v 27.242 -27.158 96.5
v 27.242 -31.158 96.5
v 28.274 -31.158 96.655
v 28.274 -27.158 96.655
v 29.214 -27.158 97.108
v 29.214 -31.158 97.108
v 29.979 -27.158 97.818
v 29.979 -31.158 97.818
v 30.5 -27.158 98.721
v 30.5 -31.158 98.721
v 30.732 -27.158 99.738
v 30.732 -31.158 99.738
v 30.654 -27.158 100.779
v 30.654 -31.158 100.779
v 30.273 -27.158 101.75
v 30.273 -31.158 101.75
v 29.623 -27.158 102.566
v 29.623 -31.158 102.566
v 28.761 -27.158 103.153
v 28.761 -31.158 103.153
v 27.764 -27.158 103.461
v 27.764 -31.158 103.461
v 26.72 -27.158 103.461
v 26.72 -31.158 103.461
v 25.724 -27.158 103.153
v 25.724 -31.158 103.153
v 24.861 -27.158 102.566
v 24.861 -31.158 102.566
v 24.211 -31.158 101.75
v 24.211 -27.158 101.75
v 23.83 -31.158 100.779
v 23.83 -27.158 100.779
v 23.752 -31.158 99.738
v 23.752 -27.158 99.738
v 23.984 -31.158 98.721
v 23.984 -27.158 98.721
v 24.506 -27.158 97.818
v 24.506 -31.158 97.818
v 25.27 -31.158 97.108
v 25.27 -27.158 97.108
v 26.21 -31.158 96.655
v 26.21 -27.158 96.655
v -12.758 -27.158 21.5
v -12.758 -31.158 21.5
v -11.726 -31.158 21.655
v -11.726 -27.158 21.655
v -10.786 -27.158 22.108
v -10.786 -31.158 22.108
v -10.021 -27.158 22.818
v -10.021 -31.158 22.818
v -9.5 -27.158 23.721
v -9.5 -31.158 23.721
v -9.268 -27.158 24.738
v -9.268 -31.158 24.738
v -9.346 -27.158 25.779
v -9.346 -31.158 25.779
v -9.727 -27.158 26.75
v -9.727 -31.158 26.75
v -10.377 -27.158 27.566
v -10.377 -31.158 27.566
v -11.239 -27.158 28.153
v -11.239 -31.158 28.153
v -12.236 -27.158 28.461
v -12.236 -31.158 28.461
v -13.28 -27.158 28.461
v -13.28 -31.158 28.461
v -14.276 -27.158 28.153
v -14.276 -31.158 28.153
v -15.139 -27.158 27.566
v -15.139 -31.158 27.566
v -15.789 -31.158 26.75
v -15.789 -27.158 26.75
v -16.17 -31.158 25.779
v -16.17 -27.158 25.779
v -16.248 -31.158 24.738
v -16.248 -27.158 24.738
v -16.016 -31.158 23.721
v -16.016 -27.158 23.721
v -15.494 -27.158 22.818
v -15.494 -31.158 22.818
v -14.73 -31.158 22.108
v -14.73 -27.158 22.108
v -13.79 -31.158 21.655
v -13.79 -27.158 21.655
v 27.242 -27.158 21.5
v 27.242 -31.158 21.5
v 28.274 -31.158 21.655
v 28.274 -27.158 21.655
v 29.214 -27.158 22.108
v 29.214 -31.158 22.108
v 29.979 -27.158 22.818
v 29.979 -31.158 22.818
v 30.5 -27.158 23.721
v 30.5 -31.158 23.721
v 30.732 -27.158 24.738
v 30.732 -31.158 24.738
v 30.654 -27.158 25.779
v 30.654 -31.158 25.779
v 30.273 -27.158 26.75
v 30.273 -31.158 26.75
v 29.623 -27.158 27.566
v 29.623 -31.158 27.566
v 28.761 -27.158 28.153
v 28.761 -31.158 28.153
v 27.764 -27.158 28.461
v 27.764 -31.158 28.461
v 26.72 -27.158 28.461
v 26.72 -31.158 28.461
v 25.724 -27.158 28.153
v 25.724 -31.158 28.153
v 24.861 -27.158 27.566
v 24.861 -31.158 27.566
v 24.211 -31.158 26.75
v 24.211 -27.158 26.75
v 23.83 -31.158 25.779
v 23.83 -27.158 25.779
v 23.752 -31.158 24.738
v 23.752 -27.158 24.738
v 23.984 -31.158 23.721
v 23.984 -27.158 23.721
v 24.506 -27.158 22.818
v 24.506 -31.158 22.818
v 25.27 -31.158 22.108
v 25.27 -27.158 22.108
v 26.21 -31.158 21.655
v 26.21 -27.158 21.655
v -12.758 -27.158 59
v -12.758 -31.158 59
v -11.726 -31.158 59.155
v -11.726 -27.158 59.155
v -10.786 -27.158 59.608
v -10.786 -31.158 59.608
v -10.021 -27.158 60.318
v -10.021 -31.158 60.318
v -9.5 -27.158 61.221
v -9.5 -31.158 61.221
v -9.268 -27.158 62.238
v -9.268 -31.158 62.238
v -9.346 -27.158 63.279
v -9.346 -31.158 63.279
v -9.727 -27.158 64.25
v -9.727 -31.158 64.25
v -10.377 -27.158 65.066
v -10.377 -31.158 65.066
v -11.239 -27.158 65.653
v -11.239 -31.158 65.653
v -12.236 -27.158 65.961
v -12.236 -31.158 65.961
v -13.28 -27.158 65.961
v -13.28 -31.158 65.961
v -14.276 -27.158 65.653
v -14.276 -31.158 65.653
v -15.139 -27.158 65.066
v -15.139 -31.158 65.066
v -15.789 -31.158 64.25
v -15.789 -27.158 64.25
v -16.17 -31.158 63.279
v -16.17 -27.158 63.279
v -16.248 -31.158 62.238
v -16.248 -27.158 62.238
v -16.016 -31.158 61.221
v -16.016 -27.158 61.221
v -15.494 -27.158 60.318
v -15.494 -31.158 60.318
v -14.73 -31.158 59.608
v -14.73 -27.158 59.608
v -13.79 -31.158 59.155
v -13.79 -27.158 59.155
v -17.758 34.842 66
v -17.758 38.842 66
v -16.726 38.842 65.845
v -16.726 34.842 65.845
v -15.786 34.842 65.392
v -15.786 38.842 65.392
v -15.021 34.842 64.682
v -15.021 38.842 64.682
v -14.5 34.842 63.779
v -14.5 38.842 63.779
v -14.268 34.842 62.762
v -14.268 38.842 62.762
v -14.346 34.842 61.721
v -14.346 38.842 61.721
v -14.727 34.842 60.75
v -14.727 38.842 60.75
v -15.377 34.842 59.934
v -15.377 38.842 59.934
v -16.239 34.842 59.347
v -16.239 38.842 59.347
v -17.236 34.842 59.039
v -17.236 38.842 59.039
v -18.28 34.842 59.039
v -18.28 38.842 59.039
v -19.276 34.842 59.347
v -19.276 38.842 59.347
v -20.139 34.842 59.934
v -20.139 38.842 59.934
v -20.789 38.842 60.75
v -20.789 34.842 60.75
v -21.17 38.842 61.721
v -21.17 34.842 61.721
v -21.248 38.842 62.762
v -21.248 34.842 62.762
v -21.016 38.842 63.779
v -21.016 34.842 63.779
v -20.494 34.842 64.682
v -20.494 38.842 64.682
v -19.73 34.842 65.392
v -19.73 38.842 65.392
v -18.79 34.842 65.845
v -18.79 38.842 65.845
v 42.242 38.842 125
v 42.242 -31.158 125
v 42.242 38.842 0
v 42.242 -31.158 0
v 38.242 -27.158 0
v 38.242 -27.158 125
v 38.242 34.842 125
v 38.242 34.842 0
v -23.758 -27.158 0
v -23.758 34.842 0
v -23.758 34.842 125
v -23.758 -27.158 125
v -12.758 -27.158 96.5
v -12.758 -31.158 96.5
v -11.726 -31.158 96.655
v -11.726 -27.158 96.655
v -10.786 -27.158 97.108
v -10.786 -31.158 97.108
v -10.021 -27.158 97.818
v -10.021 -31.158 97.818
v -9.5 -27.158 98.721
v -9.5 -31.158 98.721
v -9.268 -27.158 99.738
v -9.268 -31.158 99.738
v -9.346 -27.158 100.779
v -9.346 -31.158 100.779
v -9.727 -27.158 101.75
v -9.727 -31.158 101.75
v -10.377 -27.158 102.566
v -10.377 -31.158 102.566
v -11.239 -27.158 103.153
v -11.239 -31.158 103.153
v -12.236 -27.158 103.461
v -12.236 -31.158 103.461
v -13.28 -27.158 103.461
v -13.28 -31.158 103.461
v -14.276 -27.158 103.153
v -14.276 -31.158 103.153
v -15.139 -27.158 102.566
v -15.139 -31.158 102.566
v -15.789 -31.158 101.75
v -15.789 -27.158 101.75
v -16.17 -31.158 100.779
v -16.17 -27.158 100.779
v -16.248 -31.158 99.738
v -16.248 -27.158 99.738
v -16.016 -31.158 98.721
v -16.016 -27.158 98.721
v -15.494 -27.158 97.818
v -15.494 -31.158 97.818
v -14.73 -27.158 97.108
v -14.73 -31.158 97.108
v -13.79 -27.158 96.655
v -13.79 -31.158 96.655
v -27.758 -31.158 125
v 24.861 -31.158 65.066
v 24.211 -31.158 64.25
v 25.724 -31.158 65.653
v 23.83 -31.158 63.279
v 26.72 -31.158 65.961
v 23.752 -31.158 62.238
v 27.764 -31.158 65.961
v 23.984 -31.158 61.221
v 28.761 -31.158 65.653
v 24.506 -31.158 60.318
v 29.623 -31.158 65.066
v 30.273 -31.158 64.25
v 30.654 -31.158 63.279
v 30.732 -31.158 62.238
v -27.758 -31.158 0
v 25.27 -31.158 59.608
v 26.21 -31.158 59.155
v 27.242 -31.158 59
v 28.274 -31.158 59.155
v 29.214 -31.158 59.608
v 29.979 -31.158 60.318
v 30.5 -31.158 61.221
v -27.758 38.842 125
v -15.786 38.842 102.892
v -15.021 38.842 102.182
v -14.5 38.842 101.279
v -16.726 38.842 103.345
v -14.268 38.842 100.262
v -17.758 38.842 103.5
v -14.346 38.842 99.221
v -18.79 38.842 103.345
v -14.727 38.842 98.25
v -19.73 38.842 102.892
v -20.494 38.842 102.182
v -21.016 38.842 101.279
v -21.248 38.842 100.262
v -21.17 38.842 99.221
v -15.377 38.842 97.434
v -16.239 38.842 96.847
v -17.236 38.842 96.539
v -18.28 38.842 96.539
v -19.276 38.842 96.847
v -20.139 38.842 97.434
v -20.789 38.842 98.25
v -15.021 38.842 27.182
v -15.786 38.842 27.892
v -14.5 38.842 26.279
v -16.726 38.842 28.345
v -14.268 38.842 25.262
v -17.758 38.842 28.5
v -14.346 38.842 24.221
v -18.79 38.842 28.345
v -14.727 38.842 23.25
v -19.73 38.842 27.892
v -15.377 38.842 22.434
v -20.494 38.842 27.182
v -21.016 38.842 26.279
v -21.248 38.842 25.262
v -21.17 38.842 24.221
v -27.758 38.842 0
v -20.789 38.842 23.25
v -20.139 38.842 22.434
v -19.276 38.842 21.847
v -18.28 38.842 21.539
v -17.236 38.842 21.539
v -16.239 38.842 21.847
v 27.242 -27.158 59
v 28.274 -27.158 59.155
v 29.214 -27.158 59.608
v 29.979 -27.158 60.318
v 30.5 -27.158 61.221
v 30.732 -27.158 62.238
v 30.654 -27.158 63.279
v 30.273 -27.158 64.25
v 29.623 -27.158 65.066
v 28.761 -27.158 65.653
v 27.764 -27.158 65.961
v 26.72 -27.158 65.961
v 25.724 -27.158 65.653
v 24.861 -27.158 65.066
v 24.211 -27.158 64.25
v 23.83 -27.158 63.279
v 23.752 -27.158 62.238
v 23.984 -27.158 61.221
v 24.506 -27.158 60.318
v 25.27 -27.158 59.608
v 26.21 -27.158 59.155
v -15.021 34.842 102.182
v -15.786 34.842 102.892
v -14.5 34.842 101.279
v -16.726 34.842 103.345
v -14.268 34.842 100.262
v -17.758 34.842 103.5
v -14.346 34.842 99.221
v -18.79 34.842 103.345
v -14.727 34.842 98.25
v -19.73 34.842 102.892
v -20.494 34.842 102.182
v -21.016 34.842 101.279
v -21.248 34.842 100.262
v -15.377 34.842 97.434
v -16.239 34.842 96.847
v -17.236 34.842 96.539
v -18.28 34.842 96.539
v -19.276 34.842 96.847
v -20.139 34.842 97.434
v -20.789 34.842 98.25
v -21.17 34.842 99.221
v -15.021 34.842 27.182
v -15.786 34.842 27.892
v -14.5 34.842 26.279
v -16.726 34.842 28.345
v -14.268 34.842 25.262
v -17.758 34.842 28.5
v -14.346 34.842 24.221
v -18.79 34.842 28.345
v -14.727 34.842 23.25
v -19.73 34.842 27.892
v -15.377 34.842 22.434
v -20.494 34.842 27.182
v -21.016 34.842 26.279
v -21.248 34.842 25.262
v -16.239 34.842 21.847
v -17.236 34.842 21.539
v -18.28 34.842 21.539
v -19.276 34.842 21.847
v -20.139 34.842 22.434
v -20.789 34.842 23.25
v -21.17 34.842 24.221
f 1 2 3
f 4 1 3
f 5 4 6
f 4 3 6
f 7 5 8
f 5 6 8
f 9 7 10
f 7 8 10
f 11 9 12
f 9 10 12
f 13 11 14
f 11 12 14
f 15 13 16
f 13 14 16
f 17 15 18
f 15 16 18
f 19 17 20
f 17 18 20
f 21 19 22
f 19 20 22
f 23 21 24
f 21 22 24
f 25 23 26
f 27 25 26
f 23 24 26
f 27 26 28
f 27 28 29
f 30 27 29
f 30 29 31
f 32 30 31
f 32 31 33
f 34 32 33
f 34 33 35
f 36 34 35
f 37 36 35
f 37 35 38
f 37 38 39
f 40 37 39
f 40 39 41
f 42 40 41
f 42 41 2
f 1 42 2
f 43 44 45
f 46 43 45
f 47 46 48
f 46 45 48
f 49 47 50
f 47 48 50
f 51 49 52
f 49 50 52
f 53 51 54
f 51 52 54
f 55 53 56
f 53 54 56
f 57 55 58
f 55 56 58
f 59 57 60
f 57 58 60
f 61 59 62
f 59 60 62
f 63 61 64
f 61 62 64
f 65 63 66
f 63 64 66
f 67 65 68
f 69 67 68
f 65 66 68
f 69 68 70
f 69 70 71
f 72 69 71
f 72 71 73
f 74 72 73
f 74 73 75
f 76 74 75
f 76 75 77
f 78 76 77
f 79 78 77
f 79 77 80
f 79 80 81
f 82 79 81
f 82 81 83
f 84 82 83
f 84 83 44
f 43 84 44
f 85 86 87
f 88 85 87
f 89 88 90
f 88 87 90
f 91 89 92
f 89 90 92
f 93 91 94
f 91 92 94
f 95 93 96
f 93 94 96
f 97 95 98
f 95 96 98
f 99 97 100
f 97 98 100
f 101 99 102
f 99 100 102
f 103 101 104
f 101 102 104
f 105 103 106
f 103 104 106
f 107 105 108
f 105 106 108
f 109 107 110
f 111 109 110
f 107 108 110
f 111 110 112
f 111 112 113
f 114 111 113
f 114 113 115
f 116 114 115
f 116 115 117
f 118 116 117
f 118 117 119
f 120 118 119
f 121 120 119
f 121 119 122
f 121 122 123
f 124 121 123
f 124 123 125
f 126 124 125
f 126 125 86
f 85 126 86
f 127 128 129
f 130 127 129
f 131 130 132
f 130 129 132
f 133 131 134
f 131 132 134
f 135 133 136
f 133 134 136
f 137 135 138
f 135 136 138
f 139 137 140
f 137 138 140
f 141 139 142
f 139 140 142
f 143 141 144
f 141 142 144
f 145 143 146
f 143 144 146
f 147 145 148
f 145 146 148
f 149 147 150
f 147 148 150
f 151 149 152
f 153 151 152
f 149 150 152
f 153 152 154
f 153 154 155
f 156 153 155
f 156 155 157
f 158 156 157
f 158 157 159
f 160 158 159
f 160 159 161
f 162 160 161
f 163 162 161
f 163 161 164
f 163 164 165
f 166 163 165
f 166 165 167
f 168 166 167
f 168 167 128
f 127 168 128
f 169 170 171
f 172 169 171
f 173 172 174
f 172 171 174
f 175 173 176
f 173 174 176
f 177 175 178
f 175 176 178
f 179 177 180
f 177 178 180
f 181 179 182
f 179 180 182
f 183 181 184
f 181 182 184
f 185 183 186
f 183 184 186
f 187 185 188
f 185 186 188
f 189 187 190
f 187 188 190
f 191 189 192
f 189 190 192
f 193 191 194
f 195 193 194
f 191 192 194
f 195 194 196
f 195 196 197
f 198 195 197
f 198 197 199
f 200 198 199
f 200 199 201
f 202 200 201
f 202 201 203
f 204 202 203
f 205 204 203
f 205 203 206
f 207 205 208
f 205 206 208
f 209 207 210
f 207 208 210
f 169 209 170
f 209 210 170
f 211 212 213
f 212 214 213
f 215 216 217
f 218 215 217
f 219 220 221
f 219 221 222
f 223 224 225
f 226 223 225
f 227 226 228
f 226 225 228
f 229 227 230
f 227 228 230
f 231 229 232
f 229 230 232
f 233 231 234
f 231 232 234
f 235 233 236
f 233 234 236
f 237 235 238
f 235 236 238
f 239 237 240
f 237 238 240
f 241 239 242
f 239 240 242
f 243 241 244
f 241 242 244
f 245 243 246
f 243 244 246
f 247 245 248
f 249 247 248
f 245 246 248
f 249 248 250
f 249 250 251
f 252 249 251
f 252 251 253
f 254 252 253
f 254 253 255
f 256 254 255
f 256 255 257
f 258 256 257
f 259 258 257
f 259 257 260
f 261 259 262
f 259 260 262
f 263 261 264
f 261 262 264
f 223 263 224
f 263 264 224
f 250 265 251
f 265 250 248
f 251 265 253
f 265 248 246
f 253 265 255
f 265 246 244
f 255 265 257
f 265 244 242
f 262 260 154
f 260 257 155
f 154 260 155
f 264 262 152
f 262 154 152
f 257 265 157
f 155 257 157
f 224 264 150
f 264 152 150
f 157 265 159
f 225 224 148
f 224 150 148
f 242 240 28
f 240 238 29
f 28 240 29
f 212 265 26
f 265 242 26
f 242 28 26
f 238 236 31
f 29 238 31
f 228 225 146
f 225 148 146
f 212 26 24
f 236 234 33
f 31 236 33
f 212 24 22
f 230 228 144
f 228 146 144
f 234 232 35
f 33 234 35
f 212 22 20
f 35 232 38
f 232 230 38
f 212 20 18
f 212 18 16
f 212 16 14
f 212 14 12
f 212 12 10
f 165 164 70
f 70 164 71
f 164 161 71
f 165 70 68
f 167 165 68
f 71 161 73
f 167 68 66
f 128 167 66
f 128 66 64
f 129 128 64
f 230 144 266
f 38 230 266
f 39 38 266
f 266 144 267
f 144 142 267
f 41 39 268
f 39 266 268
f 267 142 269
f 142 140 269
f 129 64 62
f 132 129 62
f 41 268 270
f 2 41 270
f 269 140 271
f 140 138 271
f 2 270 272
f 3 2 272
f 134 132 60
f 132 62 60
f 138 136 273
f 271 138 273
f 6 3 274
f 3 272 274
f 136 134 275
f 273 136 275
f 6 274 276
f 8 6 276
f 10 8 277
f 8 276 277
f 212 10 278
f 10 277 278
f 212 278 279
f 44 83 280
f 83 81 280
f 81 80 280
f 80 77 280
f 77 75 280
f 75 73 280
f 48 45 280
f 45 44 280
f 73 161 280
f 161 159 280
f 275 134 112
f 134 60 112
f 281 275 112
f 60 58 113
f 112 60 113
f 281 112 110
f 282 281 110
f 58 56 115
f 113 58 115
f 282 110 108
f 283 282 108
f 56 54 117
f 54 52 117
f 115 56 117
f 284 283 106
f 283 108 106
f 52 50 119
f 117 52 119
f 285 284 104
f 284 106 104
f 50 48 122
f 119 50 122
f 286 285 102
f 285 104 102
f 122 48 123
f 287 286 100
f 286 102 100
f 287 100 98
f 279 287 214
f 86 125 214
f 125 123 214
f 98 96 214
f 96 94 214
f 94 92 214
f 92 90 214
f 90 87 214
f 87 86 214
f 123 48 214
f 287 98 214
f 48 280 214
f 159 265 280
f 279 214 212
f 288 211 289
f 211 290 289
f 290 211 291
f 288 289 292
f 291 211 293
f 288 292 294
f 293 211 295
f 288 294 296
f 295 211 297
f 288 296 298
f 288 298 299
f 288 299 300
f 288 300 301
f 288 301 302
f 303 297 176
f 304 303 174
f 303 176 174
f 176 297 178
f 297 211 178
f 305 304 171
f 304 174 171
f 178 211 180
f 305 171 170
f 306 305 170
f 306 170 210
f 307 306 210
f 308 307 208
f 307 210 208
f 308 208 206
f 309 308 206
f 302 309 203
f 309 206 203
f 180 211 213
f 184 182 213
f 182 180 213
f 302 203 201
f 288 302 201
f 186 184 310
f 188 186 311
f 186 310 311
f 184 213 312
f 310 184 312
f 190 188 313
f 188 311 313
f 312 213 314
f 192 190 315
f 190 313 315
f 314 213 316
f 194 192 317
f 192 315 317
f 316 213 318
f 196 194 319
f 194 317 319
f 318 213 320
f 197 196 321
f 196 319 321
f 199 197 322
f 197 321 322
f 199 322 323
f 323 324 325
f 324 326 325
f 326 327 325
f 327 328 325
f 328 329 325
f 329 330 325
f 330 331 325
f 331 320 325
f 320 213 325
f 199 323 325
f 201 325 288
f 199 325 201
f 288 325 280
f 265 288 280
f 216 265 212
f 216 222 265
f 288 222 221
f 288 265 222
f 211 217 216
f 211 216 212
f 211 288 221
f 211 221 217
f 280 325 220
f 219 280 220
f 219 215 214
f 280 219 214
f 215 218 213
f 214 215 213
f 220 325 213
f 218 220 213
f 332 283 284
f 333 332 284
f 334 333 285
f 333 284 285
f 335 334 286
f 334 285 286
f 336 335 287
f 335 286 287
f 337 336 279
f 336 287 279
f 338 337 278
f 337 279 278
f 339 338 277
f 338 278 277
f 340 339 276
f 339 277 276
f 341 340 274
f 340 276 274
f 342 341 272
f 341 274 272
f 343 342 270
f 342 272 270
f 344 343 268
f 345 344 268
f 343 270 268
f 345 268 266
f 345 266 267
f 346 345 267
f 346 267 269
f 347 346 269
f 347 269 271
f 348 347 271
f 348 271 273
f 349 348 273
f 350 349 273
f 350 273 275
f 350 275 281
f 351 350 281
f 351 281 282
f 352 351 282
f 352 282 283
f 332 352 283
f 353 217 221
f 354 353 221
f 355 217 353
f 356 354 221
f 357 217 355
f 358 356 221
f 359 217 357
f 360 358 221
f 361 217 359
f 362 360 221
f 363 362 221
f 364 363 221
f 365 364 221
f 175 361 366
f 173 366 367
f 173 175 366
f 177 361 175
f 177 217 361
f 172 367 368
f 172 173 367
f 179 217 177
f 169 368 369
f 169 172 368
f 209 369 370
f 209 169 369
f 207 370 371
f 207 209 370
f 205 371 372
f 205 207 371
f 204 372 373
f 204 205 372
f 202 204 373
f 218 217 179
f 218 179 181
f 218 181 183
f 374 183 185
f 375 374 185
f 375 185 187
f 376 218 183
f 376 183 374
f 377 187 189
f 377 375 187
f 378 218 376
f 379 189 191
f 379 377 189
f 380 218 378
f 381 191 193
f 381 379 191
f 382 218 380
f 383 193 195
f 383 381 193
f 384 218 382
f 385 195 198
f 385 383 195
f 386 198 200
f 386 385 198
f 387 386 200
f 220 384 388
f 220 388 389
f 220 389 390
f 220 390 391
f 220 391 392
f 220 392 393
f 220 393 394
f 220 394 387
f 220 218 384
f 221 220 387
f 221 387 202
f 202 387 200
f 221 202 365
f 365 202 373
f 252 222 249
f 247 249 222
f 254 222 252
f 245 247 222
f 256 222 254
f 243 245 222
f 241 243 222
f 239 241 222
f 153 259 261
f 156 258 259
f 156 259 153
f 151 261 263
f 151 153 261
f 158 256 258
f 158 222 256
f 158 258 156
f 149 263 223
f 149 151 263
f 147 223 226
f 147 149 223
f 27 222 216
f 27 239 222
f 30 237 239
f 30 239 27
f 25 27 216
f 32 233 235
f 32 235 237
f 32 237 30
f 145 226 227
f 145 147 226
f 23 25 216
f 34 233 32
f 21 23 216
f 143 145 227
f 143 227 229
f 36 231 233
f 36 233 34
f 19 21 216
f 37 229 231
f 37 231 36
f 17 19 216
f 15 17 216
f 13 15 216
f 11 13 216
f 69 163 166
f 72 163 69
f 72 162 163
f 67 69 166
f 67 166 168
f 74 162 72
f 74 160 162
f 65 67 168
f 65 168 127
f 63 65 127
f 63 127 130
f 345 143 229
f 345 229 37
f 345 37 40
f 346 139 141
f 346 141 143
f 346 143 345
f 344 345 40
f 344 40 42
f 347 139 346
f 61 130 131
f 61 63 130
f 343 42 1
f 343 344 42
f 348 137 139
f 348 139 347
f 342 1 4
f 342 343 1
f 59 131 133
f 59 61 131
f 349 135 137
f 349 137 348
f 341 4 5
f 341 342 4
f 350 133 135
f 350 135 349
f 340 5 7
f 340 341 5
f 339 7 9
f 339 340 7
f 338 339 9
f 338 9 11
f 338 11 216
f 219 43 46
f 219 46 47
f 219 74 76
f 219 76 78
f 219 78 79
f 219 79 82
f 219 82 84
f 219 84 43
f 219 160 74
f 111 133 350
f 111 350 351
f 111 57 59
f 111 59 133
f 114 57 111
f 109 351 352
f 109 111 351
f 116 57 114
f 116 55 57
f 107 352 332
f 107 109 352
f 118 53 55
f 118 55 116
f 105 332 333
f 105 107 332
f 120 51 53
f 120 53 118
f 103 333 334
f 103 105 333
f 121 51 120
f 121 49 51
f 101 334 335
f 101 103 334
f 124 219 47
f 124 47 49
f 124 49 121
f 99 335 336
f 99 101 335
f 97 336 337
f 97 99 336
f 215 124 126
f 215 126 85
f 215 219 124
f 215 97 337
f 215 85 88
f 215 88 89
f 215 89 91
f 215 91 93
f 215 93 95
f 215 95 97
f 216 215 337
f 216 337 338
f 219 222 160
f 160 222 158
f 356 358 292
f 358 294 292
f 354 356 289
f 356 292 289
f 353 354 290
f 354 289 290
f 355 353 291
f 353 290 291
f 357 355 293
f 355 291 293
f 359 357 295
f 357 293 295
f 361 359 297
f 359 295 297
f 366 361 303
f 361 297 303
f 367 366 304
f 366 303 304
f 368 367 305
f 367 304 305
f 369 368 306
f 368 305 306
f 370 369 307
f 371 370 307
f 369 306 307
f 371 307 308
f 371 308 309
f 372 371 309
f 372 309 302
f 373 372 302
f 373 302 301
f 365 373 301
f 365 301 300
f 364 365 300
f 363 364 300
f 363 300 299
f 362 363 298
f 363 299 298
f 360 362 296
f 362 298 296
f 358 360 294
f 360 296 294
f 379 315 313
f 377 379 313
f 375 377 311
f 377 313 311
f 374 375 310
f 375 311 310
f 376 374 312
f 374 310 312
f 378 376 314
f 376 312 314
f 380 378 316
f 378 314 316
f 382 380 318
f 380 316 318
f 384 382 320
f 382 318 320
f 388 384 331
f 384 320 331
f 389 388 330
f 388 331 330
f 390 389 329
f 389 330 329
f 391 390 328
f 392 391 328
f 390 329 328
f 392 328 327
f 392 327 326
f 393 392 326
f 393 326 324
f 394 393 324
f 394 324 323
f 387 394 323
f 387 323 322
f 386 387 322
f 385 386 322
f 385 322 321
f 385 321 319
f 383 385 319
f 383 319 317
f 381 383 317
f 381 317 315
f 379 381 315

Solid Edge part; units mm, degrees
sketch "Sketch1" plane through (0, 0, 0) normal (0, 0, 1) x (1, 0, 0)
  line L0 (-23.7579, 34.8421) -> (-23.7579, -27.1579)
  line L1 (-23.7579, -27.1579) -> (38.2421, -27.1579)
  line L2 (38.2421, -27.1579) -> (38.2421, 34.8421)
  line L3 (38.2421, 34.8421) -> (-23.7579, 34.8421)
  line L4 (-27.7579, 38.8421) -> (-27.7579, -31.1579)
  line L5 (-27.7579, -31.1579) -> (42.2421, -31.1579)
  line L6 (42.2421, -31.1579) -> (42.2421, 38.8421)
  line L7 (42.2421, 38.8421) -> (-27.7579, 38.8421)
  dimension "D1" = 70
  dimension "D2" = 70
  dimension "D3" = 4
  dimension "D4" = 4
  dimension "D5" = 4
  dimension "D6" = 4
extrude "Protrusion1" add sketch "Sketch1" along normal blind 125
hole "Hole_1" at (-17.7579, 38.8421, 62.5) direction (0, -1, 0) diameter 7 end up to next
hole "Hole1" at (-17.7579, 38.8421, 25) direction (0, -1, 0) diameter 7 end up to next
hole "Hole2" at (-17.7579, 38.8421, 100) direction (0, -1, 0) diameter 7 end up to next
hole "Hole_4" at (-12.7579, -31.1579, 62.5) direction (0, 1, 0) diameter 7 end up to next
hole "Hole3" at (-12.7579, -31.1579, 100) direction (0, 1, 0) diameter 7 end up to next
hole "Hole4" at (27.2421, -31.1579, 100) direction (0, 1, 0) diameter 7 end up to next
hole "Hole5" at (27.2421, -31.1579, 62.5) direction (0, 1, 0) diameter 7 end up to next
hole "Hole6" at (27.2421, -31.1579, 25) direction (0, 1, 0) diameter 7 end up to next
hole "Hole7" at (-12.7579, -31.1579, 25) direction (0, 1, 0) diameter 7 end up to next
